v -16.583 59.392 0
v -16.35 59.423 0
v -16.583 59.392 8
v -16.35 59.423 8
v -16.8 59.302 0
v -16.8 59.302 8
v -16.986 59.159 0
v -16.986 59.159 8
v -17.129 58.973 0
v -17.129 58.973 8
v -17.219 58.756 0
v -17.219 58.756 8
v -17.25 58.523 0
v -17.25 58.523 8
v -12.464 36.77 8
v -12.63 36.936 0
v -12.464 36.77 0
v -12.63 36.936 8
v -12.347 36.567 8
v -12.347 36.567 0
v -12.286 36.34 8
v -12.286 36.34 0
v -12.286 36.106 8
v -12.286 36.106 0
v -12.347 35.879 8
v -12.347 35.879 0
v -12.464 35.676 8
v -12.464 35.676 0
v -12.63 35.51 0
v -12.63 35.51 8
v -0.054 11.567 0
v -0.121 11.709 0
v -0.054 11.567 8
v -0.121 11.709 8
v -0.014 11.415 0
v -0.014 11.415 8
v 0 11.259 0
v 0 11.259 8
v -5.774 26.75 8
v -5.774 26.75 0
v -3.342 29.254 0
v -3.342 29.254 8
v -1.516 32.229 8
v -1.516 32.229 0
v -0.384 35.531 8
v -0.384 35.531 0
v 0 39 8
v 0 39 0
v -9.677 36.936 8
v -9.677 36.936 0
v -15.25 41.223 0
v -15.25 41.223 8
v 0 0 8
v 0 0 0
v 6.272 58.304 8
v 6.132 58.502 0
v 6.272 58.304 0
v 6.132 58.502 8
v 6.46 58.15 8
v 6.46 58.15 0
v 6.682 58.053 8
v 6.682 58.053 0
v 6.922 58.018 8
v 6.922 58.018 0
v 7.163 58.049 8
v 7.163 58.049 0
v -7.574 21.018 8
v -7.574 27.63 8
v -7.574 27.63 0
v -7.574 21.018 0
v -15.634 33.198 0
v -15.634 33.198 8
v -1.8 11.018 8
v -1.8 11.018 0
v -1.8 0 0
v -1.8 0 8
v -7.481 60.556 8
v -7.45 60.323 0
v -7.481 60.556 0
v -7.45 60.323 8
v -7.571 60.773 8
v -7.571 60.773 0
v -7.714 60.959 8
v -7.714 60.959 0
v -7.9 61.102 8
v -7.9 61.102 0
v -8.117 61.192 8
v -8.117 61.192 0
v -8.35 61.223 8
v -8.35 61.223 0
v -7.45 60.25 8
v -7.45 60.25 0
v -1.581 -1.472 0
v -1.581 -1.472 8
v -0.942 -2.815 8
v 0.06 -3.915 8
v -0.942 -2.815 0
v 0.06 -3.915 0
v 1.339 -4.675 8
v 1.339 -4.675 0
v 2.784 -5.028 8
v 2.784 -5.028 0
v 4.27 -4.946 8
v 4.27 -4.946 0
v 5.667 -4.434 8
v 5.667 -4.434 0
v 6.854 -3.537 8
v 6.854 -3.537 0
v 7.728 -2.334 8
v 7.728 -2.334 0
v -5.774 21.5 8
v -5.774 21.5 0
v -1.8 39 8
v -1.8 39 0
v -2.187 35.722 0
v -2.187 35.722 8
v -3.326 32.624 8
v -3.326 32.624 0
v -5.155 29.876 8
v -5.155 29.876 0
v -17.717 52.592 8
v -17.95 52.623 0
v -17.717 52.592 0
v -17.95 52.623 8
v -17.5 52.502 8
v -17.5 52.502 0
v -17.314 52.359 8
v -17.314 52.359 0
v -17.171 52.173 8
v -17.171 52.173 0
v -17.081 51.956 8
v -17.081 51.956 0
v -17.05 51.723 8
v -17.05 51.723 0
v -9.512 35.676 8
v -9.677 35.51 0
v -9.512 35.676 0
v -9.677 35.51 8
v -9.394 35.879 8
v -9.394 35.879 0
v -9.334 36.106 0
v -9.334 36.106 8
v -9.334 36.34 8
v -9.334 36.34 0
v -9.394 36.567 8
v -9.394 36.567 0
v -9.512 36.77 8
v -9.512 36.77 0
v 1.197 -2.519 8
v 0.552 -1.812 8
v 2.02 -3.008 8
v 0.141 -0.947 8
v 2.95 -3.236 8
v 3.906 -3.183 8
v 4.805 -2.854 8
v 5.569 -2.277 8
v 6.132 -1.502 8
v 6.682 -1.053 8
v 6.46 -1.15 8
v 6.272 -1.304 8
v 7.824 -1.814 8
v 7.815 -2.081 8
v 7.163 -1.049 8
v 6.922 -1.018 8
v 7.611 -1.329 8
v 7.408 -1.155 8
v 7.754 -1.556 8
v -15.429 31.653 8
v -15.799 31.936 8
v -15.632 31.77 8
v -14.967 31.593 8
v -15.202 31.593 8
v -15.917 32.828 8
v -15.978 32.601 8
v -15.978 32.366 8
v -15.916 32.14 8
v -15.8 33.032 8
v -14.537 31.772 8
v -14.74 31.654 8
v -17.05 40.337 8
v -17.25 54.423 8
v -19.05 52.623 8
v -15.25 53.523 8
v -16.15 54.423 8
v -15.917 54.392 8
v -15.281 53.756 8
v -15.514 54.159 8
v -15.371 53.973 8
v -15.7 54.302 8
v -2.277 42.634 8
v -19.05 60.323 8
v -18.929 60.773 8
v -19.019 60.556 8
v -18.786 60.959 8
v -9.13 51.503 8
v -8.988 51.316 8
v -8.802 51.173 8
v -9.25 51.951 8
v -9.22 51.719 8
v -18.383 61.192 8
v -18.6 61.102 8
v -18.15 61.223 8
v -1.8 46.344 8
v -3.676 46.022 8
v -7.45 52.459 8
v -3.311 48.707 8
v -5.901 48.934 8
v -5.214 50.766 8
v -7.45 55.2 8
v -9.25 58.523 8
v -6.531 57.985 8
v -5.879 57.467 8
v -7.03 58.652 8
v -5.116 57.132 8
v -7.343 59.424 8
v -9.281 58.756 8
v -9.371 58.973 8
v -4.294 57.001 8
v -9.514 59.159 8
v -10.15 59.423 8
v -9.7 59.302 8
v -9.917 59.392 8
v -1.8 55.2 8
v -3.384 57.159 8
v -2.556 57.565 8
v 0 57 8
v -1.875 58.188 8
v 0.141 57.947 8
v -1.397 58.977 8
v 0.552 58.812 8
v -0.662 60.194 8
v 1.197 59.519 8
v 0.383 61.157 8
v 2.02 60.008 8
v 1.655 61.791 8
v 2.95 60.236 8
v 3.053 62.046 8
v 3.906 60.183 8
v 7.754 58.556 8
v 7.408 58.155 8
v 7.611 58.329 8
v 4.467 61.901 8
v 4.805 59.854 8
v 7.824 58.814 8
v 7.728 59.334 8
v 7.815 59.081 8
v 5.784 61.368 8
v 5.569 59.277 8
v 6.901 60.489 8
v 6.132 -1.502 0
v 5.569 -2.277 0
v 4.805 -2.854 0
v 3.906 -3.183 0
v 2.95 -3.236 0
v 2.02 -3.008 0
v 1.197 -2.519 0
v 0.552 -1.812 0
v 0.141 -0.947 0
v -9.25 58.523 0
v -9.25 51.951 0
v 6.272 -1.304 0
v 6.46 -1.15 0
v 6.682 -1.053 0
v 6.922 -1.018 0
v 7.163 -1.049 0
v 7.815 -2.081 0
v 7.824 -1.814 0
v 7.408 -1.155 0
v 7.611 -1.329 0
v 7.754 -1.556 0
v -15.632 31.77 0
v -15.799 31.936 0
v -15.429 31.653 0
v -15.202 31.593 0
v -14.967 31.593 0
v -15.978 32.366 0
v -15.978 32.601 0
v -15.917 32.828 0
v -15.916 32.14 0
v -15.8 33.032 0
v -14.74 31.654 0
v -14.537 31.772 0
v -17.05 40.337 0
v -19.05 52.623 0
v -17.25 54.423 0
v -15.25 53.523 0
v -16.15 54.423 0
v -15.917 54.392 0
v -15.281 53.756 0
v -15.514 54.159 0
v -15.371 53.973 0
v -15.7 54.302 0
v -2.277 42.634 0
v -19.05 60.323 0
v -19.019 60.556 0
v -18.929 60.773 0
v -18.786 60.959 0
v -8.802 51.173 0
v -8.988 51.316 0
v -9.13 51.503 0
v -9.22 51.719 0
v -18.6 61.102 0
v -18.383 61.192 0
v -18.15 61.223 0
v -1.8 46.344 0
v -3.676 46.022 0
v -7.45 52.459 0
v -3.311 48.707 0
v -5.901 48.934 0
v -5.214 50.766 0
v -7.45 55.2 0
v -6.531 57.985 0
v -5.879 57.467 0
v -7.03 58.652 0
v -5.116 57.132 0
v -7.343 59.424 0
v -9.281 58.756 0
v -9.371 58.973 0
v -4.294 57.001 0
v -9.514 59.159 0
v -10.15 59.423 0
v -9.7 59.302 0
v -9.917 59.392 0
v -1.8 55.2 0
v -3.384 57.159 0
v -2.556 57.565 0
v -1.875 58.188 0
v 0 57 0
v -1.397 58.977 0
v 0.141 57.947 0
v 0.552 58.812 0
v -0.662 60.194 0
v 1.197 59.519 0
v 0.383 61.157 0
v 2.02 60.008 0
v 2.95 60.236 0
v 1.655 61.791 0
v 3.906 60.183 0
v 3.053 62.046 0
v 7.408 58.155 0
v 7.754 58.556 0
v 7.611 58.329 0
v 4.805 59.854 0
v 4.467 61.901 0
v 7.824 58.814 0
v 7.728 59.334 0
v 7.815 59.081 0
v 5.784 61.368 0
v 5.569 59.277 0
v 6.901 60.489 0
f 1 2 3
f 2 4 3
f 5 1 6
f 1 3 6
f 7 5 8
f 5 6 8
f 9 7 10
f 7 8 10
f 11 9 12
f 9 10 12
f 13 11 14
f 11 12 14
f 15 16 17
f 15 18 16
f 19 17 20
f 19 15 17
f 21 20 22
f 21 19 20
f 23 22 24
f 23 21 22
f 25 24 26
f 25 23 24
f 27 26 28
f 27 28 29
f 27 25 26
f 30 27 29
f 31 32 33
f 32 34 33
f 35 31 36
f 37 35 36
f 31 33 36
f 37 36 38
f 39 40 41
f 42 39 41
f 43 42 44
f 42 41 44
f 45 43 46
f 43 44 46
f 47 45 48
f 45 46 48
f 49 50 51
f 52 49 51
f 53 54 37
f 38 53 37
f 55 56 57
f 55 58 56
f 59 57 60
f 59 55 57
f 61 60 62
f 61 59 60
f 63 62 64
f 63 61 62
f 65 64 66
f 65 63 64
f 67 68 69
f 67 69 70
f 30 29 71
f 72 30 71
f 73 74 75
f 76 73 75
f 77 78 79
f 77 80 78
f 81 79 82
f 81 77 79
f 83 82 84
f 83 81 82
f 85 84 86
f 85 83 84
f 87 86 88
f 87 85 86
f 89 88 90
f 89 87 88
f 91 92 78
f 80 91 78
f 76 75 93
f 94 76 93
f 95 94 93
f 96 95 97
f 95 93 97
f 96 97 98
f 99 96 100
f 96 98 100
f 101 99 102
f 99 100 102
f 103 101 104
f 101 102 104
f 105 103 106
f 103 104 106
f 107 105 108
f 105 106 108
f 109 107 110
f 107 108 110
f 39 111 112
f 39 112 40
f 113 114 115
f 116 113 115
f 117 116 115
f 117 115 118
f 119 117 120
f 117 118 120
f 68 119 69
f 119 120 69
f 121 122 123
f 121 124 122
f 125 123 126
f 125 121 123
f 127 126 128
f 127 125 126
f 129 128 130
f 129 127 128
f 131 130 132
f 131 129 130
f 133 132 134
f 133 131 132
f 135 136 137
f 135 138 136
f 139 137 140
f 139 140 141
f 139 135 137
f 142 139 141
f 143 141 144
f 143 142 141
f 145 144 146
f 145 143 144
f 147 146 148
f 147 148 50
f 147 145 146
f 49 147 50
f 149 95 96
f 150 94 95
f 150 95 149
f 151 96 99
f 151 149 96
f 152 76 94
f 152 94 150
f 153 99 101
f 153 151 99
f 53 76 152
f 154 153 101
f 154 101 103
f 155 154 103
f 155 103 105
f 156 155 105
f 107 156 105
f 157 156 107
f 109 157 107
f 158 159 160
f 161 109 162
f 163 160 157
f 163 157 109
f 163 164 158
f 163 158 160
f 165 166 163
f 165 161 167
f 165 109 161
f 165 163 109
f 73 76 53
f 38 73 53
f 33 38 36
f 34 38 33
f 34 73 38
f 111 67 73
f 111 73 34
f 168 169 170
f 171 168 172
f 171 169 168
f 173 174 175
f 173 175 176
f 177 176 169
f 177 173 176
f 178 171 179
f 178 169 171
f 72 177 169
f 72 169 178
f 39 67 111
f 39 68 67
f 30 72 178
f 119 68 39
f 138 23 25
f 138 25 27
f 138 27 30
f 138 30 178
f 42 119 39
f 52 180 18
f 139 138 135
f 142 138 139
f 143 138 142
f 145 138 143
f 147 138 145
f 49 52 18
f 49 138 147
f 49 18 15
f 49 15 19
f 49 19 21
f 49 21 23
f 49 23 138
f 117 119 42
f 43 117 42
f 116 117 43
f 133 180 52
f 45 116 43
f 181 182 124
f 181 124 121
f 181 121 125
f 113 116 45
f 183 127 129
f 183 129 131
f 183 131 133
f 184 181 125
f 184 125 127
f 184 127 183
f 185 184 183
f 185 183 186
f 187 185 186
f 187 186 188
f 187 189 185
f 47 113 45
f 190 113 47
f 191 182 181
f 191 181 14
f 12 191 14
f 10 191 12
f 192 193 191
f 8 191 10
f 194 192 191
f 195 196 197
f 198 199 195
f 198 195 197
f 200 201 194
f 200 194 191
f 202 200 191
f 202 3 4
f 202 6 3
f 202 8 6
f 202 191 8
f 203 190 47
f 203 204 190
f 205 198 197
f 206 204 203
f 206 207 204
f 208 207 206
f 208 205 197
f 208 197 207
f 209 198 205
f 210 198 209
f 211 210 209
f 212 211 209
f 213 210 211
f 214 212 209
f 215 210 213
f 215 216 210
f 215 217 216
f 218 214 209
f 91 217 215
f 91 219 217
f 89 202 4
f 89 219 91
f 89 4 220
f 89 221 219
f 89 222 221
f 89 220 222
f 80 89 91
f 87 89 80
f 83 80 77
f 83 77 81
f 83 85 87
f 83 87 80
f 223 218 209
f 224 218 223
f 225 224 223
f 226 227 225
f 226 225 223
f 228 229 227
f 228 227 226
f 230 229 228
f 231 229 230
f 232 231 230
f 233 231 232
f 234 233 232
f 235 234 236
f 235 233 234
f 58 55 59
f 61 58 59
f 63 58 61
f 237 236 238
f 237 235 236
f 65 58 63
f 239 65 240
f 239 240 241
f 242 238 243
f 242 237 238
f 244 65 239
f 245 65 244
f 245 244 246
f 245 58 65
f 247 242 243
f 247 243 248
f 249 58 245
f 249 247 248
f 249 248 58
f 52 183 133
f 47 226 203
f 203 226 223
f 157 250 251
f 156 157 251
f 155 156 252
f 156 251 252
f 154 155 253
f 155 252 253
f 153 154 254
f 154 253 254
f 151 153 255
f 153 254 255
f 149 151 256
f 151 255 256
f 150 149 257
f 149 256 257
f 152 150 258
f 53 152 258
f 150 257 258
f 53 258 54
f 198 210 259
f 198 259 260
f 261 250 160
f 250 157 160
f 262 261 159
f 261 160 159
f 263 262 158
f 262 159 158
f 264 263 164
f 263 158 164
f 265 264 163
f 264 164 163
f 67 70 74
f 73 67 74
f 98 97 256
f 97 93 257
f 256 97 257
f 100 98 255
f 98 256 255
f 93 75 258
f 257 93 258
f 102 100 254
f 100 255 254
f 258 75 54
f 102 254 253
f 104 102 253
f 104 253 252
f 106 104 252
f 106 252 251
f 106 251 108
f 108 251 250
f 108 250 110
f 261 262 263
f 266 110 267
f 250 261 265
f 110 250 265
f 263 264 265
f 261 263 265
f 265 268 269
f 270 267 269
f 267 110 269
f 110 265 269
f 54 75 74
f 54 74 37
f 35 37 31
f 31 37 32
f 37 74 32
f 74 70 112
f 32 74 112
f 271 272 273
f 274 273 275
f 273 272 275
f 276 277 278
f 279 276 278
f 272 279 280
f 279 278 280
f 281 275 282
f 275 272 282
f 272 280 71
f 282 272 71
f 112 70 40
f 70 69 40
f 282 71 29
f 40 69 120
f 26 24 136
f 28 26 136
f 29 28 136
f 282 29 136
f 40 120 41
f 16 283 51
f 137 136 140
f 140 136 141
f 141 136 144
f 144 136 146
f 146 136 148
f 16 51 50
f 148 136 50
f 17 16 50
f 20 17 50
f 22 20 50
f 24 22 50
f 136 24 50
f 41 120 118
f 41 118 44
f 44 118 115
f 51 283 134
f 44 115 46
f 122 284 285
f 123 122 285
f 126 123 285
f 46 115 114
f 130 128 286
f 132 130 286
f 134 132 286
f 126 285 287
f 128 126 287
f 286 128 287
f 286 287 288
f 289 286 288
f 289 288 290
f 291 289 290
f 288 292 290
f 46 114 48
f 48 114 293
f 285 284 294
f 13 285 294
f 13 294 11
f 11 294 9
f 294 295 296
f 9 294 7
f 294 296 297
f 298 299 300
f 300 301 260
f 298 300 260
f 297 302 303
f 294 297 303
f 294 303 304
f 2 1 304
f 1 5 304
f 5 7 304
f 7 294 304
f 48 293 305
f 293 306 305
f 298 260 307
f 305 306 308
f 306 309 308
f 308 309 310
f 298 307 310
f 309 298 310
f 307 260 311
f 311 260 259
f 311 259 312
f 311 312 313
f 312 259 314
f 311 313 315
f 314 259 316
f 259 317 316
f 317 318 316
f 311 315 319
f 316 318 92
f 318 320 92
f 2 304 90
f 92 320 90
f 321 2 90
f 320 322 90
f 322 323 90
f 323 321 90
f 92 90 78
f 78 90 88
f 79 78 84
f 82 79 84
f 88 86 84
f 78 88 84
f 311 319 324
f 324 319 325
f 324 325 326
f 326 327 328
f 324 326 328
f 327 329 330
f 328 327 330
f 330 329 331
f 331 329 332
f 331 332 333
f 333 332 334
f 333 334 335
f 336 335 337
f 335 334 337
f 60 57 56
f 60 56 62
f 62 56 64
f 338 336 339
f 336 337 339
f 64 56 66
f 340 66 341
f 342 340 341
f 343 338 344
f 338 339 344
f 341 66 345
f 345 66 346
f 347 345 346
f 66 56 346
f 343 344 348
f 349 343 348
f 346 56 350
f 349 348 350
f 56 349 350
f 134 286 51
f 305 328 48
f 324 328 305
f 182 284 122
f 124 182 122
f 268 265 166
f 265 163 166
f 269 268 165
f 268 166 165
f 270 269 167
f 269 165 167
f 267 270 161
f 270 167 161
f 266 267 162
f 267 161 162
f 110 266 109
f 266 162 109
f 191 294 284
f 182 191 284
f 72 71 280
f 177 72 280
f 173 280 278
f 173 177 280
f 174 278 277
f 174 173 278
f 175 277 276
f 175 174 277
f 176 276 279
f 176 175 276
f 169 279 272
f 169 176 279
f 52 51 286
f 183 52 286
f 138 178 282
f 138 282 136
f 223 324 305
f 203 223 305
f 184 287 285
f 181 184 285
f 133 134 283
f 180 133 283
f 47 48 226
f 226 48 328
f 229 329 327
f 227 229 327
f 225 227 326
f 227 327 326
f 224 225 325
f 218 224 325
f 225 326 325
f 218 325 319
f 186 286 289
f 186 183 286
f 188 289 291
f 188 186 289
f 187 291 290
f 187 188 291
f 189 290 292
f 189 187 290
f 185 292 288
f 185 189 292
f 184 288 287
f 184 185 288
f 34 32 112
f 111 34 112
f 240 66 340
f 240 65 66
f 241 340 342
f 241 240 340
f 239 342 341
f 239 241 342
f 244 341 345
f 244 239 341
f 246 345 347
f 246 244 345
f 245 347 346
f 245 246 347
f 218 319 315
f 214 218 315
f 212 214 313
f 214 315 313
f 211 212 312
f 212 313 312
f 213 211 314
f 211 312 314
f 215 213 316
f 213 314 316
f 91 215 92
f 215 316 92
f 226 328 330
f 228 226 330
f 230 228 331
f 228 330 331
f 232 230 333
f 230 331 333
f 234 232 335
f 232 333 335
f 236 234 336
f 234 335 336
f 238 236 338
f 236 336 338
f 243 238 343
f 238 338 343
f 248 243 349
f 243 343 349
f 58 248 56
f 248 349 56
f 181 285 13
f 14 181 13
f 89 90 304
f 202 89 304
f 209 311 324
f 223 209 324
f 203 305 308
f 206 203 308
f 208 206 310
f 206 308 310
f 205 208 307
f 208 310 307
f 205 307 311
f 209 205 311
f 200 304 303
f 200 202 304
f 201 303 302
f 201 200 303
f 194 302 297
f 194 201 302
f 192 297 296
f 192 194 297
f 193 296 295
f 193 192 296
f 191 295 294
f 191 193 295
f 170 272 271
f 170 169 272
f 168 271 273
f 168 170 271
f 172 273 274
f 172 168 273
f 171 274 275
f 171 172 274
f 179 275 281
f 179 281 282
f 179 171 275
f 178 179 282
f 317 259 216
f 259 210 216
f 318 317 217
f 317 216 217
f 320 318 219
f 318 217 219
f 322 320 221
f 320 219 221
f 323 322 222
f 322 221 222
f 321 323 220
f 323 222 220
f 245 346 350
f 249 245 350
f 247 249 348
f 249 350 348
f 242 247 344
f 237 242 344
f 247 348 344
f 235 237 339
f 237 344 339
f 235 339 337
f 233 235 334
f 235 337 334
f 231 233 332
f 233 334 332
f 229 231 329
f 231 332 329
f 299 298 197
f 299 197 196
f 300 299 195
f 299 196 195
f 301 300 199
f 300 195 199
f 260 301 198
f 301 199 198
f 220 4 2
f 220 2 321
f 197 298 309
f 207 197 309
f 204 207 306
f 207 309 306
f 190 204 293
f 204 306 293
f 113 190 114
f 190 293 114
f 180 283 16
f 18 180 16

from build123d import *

# Parameters (mm, degrees)
F1_DEPTH    = 8
F2_R        = 0.89999
F3_T1_DEPTH = 8


# Not quite as in the source:
# - a fillet or chamfer that OpenCascade refuses, or shapes differently, is made with other operations: its cross-section is extruded or revolved along the edge and cut away or added
# - a fillet or chamfer is up to 0.001 mm smaller than in the source, because OpenCascade refuses the exact size
# - a feature names something its author has since deleted; it is built from what else it names


with BuildPart() as f1:
    # F0 (on Top) → F1 (new body)
    with BuildSketch(Plane.XY):
        with BuildLine():
            ThreePointArc((0, 57), (2.8257898753, 60.2221957995), (6.3892589354, 57.8411618966))
            Line((6.3892589354, 57.8411618966), (8.1279254228, 58.3070361778))
            ThreePointArc((8.1279254228, 58.3070361778), (2.5908427293, 62.0067965499), (-1.8, 57))
            Line((-1.8, 57), (-7.45, 57))
            Line((-7.45, 57), (-7.45, 61.2228588262))
            Line((-7.45, 61.2228588262), (-9.7, 61.2228588262))
            Line((-9.7, 61.2228588262), (-19.05, 61.2228588262))
            Line((-19.05, 61.2228588262), (-19.05, 52.6228588262))
            Line((-19.05, 52.6228588262), (-17.05, 52.6228588262))
            Line((-17.05, 52.6228588262), (-17.05, 40.3365361308))
            Line((-17.05, 40.3365361308), (-11.702219504, 36.2228588262))
            Line((-11.702219504, 36.2228588262), (-16.3474793695, 32.6495820066))
            Line((-16.3474793695, 32.6495820066), (-15.25, 31.2228588262))
            Line((-15.25, 31.2228588262), (-8.75, 36.2228588262))
            Line((-8.75, 36.2228588262), (-15.25, 41.2228588262))
            Line((-15.25, 41.2228588262), (-15.25, 54.4228588262))
            Line((-15.25, 54.4228588262), (-17.25, 54.4228588262))
            Line((-17.25, 54.4228588262), (-17.25, 59.4228588262))
            Line((-17.25, 59.4228588262), (-9.25, 59.4228588262))
            Line((-9.25, 59.4228588262), (-9.25, 57))
            Line((-9.25, 57), (-9.25, 51.4228588262))
            ThreePointArc((-9.25, 51.4228588262), (-3.8052690832, 46.2427536444), (-1.8, 39))
            ThreePointArc((-1.8, 39), (-3.3260618955, 32.624044706), (-7.5735026919, 27.6299564509))
            Line((-7.5735026919, 27.6299564509), (-7.5735026919, 21.0176914536))
            Line((-7.5735026919, 21.0176914536), (-1.8, 11.0176914536))
            Line((-1.8, 11.0176914536), (-1.8, 0))
            ThreePointArc((-1.8, 0), (2.5908427293, -5.0067965499), (8.1279254228, -1.3070361778))
            Line((8.1279254228, -1.3070361778), (6.3892589354, -0.8411618966))
            ThreePointArc((6.3892589354, -0.8411618966), (2.8257898753, -3.2221957995), (0, 0))
            Line((0, 0), (0, 11.5))
            Line((0, 11.5), (-5.7735026919, 21.5))
            Line((-5.7735026919, 21.5), (-5.7735026919, 26.75))
            ThreePointArc((-5.7735026919, 26.75), (-1.5156985287, 32.2288141117), (0, 39))
            Line((0, 39), (0, 57))
        make_face()
        with BuildLine():
            Line((-7.45, 55.2), (-1.8, 55.2))
            Line((-1.8, 55.2), (-1.8, 46.3441924145))
            ThreePointArc((-1.8, 46.3441924145), (-4.2171968015, 49.7784455096), (-7.45, 52.4591018057))
            Line((-7.45, 52.4591018057), (-7.45, 55.2))
        make_face(mode=Mode.SUBTRACT)
    extrude(amount=F1_DEPTH)

    # F2 (radius 0.9 in the source; OpenCascade refuses exactly that, so slightly less here)
    f2_edges = [f1.edges().sort_by_distance(p)[0] for p in [
        (8.127925, 58.307036, 4),
        (6.389259, 57.841162, 4),
        (8.127925, -1.307036, 4),
        (6.389259, -0.841162, 4),
        (-11.70222, 36.222859, 4),
        (-16.347479, 32.649582, 4),
        (-15.25, 31.222859, 4),
        (-8.75, 36.222859, 4),
        (-17.25, 59.422859, 4),
        (-15.25, 54.422859, 4),
        (-9.25, 59.422859, 4),
        (-19.05, 61.222859, 4),
        (-17.05, 52.622859, 4),
        (-9.25, 51.422859, 4),
        (0, 11.5, 4),
        (-7.45, 61.222859, 4),
    ]]
    fillet(f2_edges, radius=F2_R)

    # F3: fillet of radius 3.25 on 2 edges, made by hand

    # F3_s2 → F3_t1 (join)
    with BuildSketch(Plane.XY):
        with BuildLine():
            ThreePointArc((-4.2, 57), (-6.4980970389, 57.9519029611), (-7.45, 60.25))
            Line((-7.45, 60.25), (-7.45, 57))
            Line((-7.45, 57), (-4.2, 57))
        make_face()
        with BuildLine():
            ThreePointArc((-1.3967570543, 58.9774096386), (-2.5946788815, 57.5390574817), (-4.3872442674, 57))
            Line((-4.3872442674, 57), (-1.8, 57))
            ThreePointArc((-1.8, 57), (-1.698162443, 58.0090532384), (-1.3967570543, 58.9774096386))
        make_face()
    extrude(amount=F3_T1_DEPTH)


solid = f1.part
